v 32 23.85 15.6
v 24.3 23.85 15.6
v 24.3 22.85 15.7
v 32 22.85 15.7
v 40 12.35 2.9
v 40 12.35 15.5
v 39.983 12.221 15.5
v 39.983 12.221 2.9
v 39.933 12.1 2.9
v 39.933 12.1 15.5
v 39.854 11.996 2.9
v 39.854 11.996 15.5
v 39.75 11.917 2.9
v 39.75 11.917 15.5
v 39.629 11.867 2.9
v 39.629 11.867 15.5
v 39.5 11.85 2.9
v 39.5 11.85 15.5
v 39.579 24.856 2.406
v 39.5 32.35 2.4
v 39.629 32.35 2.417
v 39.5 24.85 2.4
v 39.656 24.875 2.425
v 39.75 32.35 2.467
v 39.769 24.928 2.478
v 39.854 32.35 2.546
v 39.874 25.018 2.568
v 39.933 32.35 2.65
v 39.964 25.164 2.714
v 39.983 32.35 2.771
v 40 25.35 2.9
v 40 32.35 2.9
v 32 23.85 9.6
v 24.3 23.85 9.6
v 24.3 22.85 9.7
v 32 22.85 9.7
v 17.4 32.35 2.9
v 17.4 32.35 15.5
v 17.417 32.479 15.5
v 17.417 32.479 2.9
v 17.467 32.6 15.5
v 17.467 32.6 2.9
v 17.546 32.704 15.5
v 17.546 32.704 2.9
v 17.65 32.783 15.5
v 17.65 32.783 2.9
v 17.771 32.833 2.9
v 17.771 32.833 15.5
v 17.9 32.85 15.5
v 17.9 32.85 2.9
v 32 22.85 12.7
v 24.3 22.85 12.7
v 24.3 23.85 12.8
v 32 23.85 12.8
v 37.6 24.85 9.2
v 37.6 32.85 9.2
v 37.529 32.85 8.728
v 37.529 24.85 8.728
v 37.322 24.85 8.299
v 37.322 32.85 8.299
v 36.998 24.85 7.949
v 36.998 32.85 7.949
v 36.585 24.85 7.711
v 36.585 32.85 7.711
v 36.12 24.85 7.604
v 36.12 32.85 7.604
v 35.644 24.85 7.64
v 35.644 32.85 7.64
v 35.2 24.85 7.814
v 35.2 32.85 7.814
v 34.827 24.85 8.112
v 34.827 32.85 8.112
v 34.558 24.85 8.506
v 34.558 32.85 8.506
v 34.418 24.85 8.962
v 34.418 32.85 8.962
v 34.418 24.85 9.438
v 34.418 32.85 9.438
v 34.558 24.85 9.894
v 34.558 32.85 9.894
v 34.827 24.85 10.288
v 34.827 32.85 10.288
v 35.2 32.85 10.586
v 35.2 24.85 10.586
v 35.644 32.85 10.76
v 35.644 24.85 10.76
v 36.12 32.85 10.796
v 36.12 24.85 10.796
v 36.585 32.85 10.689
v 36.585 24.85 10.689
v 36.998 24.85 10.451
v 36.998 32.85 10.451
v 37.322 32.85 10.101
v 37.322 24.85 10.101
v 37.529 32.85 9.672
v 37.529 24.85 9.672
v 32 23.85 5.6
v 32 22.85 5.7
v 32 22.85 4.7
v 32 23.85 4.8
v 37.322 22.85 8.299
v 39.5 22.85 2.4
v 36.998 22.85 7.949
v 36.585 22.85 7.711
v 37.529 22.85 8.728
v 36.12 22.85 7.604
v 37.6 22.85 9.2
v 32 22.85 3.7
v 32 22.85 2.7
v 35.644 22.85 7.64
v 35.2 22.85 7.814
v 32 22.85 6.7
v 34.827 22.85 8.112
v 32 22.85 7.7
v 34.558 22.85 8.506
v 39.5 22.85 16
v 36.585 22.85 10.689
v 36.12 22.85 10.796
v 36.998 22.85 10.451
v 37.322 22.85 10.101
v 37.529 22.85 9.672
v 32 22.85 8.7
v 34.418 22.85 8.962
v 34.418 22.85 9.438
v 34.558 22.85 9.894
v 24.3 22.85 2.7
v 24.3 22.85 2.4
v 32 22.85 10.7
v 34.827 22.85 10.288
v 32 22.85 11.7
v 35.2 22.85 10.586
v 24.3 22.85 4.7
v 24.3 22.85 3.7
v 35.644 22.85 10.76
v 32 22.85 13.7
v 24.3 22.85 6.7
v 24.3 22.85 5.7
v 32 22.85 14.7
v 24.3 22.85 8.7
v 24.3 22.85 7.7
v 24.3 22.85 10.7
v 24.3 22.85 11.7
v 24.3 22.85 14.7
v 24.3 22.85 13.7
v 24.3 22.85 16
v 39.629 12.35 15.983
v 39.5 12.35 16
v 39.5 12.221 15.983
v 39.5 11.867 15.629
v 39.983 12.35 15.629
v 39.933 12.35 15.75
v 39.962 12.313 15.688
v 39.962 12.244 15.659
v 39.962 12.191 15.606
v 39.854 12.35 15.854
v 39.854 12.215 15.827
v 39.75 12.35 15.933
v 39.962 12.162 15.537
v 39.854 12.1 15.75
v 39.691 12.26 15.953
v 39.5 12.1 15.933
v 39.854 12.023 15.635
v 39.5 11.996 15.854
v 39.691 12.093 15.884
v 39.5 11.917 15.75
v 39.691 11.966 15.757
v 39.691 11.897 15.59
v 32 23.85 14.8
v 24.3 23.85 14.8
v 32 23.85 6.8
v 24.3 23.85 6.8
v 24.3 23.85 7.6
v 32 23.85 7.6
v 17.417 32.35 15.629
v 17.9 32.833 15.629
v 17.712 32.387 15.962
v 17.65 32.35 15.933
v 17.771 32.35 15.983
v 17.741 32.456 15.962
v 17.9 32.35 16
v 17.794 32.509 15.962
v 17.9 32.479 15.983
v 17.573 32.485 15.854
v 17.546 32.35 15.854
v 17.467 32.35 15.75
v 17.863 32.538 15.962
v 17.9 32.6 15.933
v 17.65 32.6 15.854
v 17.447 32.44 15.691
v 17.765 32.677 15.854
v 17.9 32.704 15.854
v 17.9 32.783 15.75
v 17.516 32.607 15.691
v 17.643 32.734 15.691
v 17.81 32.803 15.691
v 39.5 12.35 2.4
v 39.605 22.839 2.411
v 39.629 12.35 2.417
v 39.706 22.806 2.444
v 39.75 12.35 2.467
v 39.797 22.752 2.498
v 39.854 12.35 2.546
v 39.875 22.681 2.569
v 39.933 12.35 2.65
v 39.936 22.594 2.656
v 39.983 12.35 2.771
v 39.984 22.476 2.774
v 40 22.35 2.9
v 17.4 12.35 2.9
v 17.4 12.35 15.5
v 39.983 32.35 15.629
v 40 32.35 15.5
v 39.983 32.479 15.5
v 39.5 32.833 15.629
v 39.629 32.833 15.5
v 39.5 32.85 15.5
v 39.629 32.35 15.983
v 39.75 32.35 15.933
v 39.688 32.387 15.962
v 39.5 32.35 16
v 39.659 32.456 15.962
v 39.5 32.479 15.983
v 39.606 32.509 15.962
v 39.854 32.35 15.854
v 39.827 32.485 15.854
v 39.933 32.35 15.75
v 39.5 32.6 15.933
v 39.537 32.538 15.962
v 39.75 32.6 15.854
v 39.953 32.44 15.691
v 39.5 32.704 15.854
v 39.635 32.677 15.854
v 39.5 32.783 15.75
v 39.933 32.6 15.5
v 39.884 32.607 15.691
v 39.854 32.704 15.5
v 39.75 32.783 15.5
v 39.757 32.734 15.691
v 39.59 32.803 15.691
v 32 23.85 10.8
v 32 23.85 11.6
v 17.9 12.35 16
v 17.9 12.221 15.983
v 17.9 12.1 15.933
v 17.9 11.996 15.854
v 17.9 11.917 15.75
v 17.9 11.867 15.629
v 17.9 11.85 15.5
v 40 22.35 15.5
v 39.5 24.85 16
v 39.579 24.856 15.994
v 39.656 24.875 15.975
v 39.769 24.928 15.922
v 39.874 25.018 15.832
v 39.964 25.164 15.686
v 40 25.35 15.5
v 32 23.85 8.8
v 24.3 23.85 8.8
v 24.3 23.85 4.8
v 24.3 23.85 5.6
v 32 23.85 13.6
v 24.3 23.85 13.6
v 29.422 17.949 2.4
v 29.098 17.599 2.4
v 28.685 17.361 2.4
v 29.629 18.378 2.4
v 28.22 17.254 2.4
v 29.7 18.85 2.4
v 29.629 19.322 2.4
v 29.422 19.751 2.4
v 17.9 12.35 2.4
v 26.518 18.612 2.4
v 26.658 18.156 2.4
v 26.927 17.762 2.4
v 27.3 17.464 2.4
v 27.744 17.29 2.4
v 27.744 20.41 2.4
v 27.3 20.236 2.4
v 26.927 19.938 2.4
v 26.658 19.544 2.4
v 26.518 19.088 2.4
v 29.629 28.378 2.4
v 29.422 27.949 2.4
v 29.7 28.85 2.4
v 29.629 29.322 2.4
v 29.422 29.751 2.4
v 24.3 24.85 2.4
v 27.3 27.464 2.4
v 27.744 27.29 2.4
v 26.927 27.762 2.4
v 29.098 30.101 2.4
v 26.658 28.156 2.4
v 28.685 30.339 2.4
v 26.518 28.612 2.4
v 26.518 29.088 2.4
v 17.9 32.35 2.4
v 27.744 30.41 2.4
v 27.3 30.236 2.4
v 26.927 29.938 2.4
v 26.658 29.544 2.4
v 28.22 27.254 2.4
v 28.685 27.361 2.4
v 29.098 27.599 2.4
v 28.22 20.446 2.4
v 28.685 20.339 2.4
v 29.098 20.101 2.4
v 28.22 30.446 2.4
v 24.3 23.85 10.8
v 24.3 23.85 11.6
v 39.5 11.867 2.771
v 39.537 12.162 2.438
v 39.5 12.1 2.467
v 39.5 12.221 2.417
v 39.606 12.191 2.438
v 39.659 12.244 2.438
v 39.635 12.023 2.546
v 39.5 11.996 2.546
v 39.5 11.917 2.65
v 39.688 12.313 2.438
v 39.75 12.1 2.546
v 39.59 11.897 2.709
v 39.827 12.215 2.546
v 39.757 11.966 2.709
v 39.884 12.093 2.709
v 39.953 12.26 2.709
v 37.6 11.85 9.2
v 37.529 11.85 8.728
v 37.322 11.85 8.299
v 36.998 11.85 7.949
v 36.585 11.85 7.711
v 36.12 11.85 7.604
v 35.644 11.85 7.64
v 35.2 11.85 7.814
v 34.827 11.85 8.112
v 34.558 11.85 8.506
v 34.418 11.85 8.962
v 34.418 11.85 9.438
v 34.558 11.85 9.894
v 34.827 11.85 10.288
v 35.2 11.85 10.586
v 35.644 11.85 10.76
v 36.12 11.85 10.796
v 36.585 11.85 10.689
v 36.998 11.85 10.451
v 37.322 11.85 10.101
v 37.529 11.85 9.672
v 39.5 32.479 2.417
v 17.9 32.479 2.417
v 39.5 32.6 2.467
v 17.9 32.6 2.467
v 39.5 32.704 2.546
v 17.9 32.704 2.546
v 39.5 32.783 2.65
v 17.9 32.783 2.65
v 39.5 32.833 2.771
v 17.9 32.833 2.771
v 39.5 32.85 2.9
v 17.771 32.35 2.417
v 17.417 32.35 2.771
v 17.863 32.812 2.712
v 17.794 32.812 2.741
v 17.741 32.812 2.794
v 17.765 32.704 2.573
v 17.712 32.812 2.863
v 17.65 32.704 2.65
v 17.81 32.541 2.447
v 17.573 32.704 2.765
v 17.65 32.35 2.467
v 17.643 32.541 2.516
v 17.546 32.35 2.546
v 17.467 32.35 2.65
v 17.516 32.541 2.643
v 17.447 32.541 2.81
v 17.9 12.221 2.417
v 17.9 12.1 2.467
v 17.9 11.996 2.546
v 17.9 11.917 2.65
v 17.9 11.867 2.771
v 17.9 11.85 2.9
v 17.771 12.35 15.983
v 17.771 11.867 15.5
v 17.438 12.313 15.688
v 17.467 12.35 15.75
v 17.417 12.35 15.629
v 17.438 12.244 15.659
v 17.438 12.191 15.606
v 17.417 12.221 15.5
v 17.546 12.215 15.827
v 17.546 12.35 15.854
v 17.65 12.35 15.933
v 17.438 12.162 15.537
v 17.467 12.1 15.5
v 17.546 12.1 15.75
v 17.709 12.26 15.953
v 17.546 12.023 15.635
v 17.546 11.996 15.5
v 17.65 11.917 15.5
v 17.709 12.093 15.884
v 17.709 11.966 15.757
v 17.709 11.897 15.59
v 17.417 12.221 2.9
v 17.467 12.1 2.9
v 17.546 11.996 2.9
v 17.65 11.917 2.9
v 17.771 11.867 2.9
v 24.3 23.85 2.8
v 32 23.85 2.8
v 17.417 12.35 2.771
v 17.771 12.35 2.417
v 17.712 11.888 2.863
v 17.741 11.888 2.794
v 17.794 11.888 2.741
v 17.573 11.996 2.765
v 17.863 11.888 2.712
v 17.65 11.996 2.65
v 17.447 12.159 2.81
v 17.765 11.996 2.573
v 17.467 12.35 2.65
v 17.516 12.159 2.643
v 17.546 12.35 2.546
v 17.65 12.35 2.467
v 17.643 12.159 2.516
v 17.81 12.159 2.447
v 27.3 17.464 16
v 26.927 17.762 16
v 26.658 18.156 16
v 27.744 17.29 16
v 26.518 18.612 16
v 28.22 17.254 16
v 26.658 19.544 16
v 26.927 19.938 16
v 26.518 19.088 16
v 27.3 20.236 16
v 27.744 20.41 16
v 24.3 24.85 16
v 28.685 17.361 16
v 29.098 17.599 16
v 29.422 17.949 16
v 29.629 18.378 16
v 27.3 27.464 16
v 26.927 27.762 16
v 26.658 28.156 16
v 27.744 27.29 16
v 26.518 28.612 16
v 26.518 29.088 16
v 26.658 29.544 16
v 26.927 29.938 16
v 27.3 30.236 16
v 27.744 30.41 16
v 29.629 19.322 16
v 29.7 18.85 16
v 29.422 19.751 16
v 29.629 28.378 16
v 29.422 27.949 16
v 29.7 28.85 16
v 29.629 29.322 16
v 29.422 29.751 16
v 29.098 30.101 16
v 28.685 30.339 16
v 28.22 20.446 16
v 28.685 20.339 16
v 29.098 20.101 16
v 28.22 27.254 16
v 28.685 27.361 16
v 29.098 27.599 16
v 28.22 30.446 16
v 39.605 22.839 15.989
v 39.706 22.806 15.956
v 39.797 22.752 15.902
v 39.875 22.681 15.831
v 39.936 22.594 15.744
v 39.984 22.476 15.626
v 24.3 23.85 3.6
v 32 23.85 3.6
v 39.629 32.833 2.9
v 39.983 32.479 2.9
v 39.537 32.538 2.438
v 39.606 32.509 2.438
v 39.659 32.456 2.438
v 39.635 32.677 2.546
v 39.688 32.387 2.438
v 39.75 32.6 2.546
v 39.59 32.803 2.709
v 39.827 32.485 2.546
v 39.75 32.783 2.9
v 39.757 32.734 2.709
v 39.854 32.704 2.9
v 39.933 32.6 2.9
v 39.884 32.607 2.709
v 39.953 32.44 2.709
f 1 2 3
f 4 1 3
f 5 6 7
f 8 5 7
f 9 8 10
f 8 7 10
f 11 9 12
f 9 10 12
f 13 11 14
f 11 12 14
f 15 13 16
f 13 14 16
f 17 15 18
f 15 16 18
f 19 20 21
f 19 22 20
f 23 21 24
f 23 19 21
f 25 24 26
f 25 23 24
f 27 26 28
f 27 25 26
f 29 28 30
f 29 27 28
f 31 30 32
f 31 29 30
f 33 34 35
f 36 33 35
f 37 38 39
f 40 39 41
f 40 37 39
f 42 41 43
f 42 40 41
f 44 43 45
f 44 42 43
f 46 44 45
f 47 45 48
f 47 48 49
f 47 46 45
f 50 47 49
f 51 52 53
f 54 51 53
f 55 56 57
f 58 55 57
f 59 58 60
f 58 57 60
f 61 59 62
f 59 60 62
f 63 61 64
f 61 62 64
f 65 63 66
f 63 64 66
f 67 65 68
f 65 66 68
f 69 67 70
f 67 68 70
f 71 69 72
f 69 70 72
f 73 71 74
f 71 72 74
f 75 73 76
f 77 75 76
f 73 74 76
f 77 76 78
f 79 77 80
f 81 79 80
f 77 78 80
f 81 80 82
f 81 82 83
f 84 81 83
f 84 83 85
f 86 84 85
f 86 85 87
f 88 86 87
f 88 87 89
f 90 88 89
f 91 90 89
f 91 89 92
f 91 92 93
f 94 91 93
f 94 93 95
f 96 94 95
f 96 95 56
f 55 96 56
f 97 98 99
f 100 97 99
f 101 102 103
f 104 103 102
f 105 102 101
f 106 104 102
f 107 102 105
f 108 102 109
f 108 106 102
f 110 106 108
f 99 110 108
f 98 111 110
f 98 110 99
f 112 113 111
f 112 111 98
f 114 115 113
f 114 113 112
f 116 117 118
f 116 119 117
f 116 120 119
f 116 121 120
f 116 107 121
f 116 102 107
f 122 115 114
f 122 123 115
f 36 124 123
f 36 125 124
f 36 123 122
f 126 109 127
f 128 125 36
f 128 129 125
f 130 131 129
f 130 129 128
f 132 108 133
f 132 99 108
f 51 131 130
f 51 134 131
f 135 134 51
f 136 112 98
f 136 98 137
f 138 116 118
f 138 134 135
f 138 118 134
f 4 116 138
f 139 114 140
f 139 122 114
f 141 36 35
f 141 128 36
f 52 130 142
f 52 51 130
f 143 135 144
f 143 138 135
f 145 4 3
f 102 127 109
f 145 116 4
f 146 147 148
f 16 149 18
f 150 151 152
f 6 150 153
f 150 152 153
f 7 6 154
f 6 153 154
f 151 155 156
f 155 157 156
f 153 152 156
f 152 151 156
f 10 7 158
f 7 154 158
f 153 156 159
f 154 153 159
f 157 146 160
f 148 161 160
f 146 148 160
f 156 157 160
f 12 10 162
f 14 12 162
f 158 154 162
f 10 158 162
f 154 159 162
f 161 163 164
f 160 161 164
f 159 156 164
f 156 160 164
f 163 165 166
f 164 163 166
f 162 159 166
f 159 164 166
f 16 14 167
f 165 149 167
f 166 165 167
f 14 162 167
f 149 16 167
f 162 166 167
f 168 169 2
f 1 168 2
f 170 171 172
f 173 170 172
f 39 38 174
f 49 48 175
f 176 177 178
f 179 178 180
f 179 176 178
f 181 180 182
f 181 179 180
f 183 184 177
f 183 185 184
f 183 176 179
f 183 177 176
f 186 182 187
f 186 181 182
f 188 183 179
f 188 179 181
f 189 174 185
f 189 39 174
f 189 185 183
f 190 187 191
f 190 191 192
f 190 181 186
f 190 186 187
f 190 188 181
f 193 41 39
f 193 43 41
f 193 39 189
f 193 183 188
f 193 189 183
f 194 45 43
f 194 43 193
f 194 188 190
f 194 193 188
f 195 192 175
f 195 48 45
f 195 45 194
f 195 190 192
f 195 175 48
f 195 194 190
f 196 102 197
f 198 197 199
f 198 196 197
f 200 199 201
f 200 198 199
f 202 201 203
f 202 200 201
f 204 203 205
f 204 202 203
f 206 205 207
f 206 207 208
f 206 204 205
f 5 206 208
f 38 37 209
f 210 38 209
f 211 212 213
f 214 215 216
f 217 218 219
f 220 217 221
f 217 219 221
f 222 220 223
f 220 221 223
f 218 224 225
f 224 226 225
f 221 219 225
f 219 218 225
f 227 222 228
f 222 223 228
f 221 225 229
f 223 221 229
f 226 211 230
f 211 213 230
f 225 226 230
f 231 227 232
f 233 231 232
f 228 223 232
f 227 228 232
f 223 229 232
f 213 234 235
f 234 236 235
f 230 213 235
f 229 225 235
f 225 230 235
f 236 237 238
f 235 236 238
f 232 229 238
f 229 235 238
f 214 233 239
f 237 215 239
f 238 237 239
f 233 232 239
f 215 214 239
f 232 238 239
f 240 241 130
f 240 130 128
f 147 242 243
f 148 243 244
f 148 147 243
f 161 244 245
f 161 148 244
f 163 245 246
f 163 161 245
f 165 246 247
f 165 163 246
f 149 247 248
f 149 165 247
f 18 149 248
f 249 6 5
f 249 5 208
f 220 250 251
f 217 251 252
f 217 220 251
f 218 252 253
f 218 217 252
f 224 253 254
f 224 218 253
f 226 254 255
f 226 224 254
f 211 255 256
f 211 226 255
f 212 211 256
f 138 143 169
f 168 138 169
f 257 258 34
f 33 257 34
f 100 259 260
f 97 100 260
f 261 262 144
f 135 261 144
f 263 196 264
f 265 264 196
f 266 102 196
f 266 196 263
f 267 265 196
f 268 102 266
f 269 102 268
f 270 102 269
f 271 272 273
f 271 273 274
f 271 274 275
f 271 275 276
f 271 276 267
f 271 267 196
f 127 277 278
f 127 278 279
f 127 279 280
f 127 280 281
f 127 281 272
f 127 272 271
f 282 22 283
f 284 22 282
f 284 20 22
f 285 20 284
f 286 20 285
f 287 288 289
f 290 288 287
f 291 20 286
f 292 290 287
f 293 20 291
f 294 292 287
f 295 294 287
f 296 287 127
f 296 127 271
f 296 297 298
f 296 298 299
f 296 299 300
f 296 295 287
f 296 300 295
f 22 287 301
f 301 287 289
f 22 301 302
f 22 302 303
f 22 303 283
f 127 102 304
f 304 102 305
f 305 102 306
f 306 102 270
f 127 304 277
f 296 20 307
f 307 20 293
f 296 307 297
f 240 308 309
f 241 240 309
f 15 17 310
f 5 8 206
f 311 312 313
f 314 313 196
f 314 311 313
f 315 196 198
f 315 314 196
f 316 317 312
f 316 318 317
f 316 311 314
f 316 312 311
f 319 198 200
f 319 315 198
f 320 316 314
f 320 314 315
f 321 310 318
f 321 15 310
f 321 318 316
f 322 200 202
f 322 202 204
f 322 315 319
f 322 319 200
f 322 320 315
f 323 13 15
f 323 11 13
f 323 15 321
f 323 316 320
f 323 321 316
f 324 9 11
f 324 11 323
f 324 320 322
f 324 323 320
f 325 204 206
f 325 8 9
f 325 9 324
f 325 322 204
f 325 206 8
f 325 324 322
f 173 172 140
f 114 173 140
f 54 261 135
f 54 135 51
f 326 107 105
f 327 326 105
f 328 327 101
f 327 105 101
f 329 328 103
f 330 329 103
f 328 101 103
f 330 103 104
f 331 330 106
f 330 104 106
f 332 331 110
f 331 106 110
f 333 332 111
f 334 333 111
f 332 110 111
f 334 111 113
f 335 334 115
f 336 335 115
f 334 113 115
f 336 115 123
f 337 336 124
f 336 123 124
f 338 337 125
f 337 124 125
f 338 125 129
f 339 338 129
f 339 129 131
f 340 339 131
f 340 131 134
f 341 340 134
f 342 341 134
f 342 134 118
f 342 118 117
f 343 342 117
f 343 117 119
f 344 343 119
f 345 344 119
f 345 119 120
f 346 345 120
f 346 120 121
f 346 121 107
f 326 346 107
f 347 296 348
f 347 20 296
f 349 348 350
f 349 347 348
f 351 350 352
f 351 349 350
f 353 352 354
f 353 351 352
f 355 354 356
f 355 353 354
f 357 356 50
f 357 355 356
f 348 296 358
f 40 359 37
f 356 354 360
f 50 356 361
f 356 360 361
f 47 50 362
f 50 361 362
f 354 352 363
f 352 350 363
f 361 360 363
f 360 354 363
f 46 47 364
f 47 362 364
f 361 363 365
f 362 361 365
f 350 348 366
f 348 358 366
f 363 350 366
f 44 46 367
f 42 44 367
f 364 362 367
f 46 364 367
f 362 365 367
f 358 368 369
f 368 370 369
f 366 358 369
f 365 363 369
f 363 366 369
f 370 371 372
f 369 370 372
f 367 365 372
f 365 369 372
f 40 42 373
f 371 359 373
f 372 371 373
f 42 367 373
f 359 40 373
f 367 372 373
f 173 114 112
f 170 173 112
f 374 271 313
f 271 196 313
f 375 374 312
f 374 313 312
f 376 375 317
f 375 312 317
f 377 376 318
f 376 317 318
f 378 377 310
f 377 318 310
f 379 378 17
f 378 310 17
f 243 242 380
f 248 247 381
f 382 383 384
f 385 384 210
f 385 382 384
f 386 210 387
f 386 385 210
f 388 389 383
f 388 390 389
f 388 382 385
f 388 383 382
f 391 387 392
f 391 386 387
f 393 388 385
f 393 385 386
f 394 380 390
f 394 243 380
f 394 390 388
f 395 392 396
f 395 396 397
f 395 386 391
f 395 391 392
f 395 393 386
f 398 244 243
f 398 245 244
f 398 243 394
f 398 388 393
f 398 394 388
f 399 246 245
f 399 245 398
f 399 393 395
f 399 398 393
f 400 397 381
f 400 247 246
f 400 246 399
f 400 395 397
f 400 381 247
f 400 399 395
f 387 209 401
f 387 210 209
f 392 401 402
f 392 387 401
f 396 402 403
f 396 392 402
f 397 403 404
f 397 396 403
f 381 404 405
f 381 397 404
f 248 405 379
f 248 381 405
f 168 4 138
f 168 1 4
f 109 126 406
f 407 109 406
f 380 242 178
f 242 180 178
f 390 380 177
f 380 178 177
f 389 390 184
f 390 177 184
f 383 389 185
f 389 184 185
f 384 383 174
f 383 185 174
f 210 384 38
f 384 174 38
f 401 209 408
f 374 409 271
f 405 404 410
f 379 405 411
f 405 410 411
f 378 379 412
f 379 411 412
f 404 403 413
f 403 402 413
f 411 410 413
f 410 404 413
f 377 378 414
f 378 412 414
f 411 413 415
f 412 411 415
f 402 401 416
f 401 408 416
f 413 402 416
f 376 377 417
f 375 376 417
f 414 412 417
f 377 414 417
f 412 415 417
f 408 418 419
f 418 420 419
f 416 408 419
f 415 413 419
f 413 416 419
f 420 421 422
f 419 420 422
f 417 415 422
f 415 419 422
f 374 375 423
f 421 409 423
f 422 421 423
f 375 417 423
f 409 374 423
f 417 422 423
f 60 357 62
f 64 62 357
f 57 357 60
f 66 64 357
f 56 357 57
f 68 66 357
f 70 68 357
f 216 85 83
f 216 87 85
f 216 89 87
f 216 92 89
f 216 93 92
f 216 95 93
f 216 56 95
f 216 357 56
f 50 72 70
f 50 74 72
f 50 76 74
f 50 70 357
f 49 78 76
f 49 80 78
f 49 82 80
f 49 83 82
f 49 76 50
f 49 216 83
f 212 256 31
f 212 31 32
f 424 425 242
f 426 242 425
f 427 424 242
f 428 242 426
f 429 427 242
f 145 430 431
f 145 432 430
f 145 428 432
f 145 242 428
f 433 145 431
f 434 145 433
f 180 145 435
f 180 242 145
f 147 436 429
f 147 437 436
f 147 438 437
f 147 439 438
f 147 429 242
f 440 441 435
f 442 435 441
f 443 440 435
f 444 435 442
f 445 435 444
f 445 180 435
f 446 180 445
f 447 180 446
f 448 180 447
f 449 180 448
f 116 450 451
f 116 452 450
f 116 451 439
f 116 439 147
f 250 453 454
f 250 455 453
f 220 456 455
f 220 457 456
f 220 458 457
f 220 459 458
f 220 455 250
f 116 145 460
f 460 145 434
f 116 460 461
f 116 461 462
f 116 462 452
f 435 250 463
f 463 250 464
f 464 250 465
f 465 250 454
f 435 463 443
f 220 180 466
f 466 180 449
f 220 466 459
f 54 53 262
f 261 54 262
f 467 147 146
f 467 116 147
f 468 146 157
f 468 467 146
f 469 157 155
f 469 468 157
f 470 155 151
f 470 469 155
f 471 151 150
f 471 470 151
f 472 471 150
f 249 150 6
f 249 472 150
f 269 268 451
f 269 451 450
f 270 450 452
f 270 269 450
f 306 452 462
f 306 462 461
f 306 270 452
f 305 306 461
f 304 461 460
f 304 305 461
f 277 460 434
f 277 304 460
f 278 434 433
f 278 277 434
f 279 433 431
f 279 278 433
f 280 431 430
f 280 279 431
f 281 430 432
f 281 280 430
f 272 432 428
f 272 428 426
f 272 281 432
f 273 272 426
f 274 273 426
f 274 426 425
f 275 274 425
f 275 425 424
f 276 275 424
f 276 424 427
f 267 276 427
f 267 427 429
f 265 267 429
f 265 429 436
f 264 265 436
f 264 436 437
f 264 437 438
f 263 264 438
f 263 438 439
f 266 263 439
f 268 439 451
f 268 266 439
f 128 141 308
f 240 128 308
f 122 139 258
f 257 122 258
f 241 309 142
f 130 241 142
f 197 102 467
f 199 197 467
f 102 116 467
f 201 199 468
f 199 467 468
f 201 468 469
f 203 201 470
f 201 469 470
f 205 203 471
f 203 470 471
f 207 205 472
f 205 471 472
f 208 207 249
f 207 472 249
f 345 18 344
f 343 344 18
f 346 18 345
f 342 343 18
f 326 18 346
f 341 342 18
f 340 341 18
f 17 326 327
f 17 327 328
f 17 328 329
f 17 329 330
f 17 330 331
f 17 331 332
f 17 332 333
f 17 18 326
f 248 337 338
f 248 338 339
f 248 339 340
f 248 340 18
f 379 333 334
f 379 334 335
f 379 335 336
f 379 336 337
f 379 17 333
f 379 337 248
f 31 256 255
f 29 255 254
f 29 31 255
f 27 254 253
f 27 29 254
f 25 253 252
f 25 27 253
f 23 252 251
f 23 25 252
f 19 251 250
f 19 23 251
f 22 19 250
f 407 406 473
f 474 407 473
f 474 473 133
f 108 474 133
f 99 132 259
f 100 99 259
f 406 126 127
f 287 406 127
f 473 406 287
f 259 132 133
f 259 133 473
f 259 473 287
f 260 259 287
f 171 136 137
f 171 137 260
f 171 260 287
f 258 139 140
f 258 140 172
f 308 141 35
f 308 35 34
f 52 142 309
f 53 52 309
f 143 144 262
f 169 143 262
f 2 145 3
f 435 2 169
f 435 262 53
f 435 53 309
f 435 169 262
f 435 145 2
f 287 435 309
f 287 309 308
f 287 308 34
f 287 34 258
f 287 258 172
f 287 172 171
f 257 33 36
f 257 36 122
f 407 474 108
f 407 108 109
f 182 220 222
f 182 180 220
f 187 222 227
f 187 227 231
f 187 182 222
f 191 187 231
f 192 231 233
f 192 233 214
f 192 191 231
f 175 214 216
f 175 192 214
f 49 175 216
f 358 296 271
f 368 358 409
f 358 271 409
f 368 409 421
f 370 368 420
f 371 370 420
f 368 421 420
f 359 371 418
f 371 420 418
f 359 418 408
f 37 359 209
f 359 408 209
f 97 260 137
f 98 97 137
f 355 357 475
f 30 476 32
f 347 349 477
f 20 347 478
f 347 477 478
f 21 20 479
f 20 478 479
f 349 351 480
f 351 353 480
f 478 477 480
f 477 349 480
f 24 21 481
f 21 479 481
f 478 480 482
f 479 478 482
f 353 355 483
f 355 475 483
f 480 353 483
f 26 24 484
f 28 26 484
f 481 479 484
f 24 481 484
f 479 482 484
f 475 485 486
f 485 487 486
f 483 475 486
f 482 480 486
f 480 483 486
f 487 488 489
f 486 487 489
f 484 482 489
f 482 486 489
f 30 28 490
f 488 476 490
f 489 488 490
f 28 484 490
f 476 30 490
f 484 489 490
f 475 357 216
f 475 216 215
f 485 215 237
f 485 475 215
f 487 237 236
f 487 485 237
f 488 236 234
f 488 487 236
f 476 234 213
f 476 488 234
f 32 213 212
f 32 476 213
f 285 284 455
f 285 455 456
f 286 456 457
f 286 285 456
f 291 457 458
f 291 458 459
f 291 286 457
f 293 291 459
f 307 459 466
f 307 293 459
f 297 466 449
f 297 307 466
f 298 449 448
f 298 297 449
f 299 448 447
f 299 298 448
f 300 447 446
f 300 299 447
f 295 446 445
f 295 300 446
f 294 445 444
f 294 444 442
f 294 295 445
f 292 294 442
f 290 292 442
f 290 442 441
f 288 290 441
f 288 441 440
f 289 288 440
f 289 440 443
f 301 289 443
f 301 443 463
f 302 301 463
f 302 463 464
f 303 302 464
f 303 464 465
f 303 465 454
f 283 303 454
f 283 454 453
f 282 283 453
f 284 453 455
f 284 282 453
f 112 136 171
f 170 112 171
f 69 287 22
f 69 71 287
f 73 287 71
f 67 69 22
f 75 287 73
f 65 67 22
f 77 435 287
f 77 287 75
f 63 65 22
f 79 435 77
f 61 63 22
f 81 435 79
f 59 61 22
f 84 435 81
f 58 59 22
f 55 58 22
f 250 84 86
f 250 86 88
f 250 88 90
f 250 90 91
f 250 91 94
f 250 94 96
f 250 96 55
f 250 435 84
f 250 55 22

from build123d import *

# Parameters (mm, degrees)
SKETCH1_R               = 1.6
SKETCH1_R_2             = 5.7
BOSS_EXTRUDE1_DEPTH     = 16
SKETCH2_R               = 1.6
CUT_EXTRUDE1_DEPTH      = 18.4
SKETCH3_W               = 8
SKETCH3_H               = 4
CUT_EXTRUDE2_DEPTH      = 14.9
SKETCH4_R               = 2.6
CUT_EXTRUDE3_DEPTH      = 25
SKETCH5_R               = 6
CUT_EXTRUDE4_DEPTH      = 6
SKETCH6_R               = 4.025
CUT_EXTRUDE5_DEPTH      = 17.4
SKETCH7_R               = 7.95
CUT_EXTRUDE6_DEPTH      = 11
SKETCH8_R               = 7.95
CUT_EXTRUDE7_DEPTH      = 11
BOSS_EXTRUDE2_DEPTH     = 7.7
SKETCH10_R              = 1.6
CUT_EXTRUDE8_DEPTH      = 21
CUT_EXTRUDE9_DEPTH      = 20
CUT_EXTRUDE9_DEPTH_BACK = 20
FILLET2_R               = 0.5


with BuildPart() as part:
    # Sketch1 → Boss-Extrude1 (new body, symmetric)
    with BuildSketch(Plane.XY):
        with BuildLine():
            Line((0, 0), (23, 0))
            Line((23, 0), (23, 11.85))
            Line((23, 11.85), (40, 11.85))
            Line((40, 11.85), (40, 22.85))
            Line((40, 22.85), (24.3, 22.85))
            Line((24.3, 22.85), (24.3, 24.85))
            Line((24.3, 24.85), (40, 24.85))
            Line((40, 24.85), (40, 32.85))
            Line((40, 32.85), (15.939721203, 32.85))
            ThreePointArc((15.939721203, 32.85), (-0.817389789, 43.335843617), (1.211999203, 23.672800478))
            ThreePointArc((1.211999203, 23.672800478), (2.953099737, 18.191047558), (0, 13.255437353))
            Line((0, 13.255437353), (0, 0))
        make_face()
        with Locations((28.1, 28.85)):
            Circle(SKETCH1_R, mode=Mode.SUBTRACT)
        with Locations((28.1, 18.85)):
            Circle(SKETCH1_R, mode=Mode.SUBTRACT)
        with Locations((5, 34)):
            Circle(SKETCH1_R_2, mode=Mode.SUBTRACT)
    extrude(amount=BOSS_EXTRUDE1_DEPTH, both=True)

    # Sketch2 → Cut-Extrude1 (cut)
    with BuildSketch(Plane(origin=(0, 0, -16), x_dir=(-1, 0, 0), z_dir=(0, 0, -1))):
        with BuildLine():
            Line((-23, 0), (-15, 0))
            Line((-15, 0), (-15, 16.5))
            Line((-15, 16.5), (-2.538348415, 16.5))
            ThreePointArc((-2.538348415, 16.5), (-2.706537293, 16.994418404), (-2.837397166, 17.5))
            Line((-2.837397166, 17.5), (-15, 17.5))
            Line((-15, 17.5), (-15, 29.417424305))
            ThreePointArc((-15, 29.417424305), (-15.609600605, 31.095456144), (-15.939721203, 32.85))
            Line((-15.939721203, 32.85), (-40, 32.85))
            Line((-40, 32.85), (-40, 24.85))
            Line((-40, 24.85), (-24.3, 24.85))
            Line((-24.3, 24.85), (-24.3, 22.85))
            Line((-24.3, 22.85), (-40, 22.85))
            Line((-40, 22.85), (-40, 11.85))
            Line((-40, 11.85), (-23, 11.85))
            Line((-23, 11.85), (-23, 0))
        make_face()
        with Locations((-28.1, 18.85)):
            Circle(SKETCH2_R, mode=Mode.SUBTRACT)
        with Locations((-28.1, 28.85)):
            Circle(SKETCH2_R, mode=Mode.SUBTRACT)
    extrude(amount=-CUT_EXTRUDE1_DEPTH, mode=Mode.SUBTRACT)

    # Sketch3 → Cut-Extrude2 (cut)
    with BuildSketch(Plane(origin=(0, 0, -16), x_dir=(-1, 0, 0), z_dir=(0, 0, -1))):
        with Locations((-8.7, 21.5)):
            Rectangle(SKETCH3_W, SKETCH3_H)
    extrude(amount=-CUT_EXTRUDE2_DEPTH, mode=Mode.SUBTRACT)

    # Sketch4 → Cut-Extrude3 (cut)
    with BuildSketch(Plane.XZ):
        with Locations((8.7, -7.6)):
            Circle(SKETCH4_R)
    extrude(amount=-CUT_EXTRUDE3_DEPTH, mode=Mode.SUBTRACT)

    # Sketch5 → Cut-Extrude4 (cut)
    with BuildSketch(Plane.XZ):
        with Locations((8.7, -7.6)):
            Circle(SKETCH5_R)
    extrude(amount=-CUT_EXTRUDE4_DEPTH, mode=Mode.SUBTRACT)

    # Sketch6 → Cut-Extrude5 (cut)
    with BuildSketch(Plane.ZY):
        with Locations((4.2, 17)):
            Circle(SKETCH6_R)
    extrude(amount=-CUT_EXTRUDE5_DEPTH, mode=Mode.SUBTRACT)

    # Sketch7 → Cut-Extrude6 (cut)
    with BuildSketch(Plane(origin=(0, 0, -16), x_dir=(-1, 0, 0), z_dir=(0, 0, -1))):
        with Locations((-5, 34)):
            Circle(SKETCH7_R)
    extrude(amount=-CUT_EXTRUDE6_DEPTH, mode=Mode.SUBTRACT)

    # Sketch8 → Cut-Extrude7 (cut)
    with BuildSketch(Plane.XY.offset(16)):
        with Locations((5, 34)):
            Circle(SKETCH8_R)
    extrude(amount=-CUT_EXTRUDE7_DEPTH, mode=Mode.SUBTRACT)

    # Sketch9 → Boss-Extrude2 (add)
    with BuildSketch(Plane(origin=(24.3, 0, 0), x_dir=(0, 0, -1), z_dir=(1, 0, 0))):
        Polygon((-15.7, 22.85), (-14.7, 22.85), (-14.8, 23.85), (-15.6, 23.85), align=None)
        Polygon((-13.6, 23.85), (-13.7, 22.85), (-12.7, 22.85), (-12.8, 23.85), align=None)
        Polygon((-11.6, 23.85), (-11.7, 22.85), (-10.7, 22.85), (-10.8, 23.85), align=None)
        Polygon((-9.6, 23.85), (-9.7, 22.85), (-8.7, 22.85), (-8.8, 23.85), align=None)
        Polygon((-7.6, 23.85), (-7.7, 22.85), (-6.7, 22.85), (-6.8, 23.85), align=None)
        Polygon((-5.6, 23.85), (-5.7, 22.85), (-4.7, 22.85), (-4.8, 23.85), align=None)
        Polygon((-3.6, 23.85), (-3.7, 22.85), (-2.7, 22.85), (-2.8, 23.85), align=None)
    extrude(amount=BOSS_EXTRUDE2_DEPTH)

    # Sketch10 → Cut-Extrude8 (cut)
    with BuildSketch(Plane(origin=(0, 32.85, 0), x_dir=(1, 0, 0), z_dir=(0, 1, 0))):
        with Locations((36, -9.2)):
            Circle(SKETCH10_R)
    extrude(amount=-CUT_EXTRUDE8_DEPTH, mode=Mode.SUBTRACT)

    # Sketch11 → Cut-Extrude9 (cut, two sides)
    with BuildSketch(Plane(origin=(0, 0, 2.4), x_dir=(-1, 0, 0), z_dir=(0, 0, -1))) as cut_extrude9_sk:
        Polygon((-23, 11.85), (-17.4, 11.85), (-17.4, 32.85), (-17.4, 56.269186849), (20.068849224, 56.269186849), (20.068849224, -12.231640917), (-23, -11.328049524), (-29.029830536, 8.113428838), align=None)
    extrude(amount=CUT_EXTRUDE9_DEPTH, mode=Mode.SUBTRACT)
    extrude(cut_extrude9_sk.sketch, amount=-CUT_EXTRUDE9_DEPTH_BACK, mode=Mode.SUBTRACT)

    # Fillet2
    fillet2_edges = [part.edges().sort_by_distance(p)[0] for p in [
        (28.7, 11.85, 16),
        (17.4, 22.35, 2.4),
        (40, 17.35, 16),
        (40, 32.85, 9.2),
        (40, 24.85, 9.2),
        (40, 22.85, 9.2),
        (40, 11.85, 9.2),
        (28.7, 32.85, 2.4),
        (17.4, 32.85, 9.2),
        (17.4, 22.35, 16),
        (17.4, 11.85, 9.2),
        (40, 28.85, 16),
        (28.7, 32.85, 16),
        (28.7, 11.85, 2.4),
        (40, 17.35, 2.4),
        (40, 28.85, 2.4),
    ]]
    fillet(fillet2_edges, radius=FILLET2_R)


solid = part.part
